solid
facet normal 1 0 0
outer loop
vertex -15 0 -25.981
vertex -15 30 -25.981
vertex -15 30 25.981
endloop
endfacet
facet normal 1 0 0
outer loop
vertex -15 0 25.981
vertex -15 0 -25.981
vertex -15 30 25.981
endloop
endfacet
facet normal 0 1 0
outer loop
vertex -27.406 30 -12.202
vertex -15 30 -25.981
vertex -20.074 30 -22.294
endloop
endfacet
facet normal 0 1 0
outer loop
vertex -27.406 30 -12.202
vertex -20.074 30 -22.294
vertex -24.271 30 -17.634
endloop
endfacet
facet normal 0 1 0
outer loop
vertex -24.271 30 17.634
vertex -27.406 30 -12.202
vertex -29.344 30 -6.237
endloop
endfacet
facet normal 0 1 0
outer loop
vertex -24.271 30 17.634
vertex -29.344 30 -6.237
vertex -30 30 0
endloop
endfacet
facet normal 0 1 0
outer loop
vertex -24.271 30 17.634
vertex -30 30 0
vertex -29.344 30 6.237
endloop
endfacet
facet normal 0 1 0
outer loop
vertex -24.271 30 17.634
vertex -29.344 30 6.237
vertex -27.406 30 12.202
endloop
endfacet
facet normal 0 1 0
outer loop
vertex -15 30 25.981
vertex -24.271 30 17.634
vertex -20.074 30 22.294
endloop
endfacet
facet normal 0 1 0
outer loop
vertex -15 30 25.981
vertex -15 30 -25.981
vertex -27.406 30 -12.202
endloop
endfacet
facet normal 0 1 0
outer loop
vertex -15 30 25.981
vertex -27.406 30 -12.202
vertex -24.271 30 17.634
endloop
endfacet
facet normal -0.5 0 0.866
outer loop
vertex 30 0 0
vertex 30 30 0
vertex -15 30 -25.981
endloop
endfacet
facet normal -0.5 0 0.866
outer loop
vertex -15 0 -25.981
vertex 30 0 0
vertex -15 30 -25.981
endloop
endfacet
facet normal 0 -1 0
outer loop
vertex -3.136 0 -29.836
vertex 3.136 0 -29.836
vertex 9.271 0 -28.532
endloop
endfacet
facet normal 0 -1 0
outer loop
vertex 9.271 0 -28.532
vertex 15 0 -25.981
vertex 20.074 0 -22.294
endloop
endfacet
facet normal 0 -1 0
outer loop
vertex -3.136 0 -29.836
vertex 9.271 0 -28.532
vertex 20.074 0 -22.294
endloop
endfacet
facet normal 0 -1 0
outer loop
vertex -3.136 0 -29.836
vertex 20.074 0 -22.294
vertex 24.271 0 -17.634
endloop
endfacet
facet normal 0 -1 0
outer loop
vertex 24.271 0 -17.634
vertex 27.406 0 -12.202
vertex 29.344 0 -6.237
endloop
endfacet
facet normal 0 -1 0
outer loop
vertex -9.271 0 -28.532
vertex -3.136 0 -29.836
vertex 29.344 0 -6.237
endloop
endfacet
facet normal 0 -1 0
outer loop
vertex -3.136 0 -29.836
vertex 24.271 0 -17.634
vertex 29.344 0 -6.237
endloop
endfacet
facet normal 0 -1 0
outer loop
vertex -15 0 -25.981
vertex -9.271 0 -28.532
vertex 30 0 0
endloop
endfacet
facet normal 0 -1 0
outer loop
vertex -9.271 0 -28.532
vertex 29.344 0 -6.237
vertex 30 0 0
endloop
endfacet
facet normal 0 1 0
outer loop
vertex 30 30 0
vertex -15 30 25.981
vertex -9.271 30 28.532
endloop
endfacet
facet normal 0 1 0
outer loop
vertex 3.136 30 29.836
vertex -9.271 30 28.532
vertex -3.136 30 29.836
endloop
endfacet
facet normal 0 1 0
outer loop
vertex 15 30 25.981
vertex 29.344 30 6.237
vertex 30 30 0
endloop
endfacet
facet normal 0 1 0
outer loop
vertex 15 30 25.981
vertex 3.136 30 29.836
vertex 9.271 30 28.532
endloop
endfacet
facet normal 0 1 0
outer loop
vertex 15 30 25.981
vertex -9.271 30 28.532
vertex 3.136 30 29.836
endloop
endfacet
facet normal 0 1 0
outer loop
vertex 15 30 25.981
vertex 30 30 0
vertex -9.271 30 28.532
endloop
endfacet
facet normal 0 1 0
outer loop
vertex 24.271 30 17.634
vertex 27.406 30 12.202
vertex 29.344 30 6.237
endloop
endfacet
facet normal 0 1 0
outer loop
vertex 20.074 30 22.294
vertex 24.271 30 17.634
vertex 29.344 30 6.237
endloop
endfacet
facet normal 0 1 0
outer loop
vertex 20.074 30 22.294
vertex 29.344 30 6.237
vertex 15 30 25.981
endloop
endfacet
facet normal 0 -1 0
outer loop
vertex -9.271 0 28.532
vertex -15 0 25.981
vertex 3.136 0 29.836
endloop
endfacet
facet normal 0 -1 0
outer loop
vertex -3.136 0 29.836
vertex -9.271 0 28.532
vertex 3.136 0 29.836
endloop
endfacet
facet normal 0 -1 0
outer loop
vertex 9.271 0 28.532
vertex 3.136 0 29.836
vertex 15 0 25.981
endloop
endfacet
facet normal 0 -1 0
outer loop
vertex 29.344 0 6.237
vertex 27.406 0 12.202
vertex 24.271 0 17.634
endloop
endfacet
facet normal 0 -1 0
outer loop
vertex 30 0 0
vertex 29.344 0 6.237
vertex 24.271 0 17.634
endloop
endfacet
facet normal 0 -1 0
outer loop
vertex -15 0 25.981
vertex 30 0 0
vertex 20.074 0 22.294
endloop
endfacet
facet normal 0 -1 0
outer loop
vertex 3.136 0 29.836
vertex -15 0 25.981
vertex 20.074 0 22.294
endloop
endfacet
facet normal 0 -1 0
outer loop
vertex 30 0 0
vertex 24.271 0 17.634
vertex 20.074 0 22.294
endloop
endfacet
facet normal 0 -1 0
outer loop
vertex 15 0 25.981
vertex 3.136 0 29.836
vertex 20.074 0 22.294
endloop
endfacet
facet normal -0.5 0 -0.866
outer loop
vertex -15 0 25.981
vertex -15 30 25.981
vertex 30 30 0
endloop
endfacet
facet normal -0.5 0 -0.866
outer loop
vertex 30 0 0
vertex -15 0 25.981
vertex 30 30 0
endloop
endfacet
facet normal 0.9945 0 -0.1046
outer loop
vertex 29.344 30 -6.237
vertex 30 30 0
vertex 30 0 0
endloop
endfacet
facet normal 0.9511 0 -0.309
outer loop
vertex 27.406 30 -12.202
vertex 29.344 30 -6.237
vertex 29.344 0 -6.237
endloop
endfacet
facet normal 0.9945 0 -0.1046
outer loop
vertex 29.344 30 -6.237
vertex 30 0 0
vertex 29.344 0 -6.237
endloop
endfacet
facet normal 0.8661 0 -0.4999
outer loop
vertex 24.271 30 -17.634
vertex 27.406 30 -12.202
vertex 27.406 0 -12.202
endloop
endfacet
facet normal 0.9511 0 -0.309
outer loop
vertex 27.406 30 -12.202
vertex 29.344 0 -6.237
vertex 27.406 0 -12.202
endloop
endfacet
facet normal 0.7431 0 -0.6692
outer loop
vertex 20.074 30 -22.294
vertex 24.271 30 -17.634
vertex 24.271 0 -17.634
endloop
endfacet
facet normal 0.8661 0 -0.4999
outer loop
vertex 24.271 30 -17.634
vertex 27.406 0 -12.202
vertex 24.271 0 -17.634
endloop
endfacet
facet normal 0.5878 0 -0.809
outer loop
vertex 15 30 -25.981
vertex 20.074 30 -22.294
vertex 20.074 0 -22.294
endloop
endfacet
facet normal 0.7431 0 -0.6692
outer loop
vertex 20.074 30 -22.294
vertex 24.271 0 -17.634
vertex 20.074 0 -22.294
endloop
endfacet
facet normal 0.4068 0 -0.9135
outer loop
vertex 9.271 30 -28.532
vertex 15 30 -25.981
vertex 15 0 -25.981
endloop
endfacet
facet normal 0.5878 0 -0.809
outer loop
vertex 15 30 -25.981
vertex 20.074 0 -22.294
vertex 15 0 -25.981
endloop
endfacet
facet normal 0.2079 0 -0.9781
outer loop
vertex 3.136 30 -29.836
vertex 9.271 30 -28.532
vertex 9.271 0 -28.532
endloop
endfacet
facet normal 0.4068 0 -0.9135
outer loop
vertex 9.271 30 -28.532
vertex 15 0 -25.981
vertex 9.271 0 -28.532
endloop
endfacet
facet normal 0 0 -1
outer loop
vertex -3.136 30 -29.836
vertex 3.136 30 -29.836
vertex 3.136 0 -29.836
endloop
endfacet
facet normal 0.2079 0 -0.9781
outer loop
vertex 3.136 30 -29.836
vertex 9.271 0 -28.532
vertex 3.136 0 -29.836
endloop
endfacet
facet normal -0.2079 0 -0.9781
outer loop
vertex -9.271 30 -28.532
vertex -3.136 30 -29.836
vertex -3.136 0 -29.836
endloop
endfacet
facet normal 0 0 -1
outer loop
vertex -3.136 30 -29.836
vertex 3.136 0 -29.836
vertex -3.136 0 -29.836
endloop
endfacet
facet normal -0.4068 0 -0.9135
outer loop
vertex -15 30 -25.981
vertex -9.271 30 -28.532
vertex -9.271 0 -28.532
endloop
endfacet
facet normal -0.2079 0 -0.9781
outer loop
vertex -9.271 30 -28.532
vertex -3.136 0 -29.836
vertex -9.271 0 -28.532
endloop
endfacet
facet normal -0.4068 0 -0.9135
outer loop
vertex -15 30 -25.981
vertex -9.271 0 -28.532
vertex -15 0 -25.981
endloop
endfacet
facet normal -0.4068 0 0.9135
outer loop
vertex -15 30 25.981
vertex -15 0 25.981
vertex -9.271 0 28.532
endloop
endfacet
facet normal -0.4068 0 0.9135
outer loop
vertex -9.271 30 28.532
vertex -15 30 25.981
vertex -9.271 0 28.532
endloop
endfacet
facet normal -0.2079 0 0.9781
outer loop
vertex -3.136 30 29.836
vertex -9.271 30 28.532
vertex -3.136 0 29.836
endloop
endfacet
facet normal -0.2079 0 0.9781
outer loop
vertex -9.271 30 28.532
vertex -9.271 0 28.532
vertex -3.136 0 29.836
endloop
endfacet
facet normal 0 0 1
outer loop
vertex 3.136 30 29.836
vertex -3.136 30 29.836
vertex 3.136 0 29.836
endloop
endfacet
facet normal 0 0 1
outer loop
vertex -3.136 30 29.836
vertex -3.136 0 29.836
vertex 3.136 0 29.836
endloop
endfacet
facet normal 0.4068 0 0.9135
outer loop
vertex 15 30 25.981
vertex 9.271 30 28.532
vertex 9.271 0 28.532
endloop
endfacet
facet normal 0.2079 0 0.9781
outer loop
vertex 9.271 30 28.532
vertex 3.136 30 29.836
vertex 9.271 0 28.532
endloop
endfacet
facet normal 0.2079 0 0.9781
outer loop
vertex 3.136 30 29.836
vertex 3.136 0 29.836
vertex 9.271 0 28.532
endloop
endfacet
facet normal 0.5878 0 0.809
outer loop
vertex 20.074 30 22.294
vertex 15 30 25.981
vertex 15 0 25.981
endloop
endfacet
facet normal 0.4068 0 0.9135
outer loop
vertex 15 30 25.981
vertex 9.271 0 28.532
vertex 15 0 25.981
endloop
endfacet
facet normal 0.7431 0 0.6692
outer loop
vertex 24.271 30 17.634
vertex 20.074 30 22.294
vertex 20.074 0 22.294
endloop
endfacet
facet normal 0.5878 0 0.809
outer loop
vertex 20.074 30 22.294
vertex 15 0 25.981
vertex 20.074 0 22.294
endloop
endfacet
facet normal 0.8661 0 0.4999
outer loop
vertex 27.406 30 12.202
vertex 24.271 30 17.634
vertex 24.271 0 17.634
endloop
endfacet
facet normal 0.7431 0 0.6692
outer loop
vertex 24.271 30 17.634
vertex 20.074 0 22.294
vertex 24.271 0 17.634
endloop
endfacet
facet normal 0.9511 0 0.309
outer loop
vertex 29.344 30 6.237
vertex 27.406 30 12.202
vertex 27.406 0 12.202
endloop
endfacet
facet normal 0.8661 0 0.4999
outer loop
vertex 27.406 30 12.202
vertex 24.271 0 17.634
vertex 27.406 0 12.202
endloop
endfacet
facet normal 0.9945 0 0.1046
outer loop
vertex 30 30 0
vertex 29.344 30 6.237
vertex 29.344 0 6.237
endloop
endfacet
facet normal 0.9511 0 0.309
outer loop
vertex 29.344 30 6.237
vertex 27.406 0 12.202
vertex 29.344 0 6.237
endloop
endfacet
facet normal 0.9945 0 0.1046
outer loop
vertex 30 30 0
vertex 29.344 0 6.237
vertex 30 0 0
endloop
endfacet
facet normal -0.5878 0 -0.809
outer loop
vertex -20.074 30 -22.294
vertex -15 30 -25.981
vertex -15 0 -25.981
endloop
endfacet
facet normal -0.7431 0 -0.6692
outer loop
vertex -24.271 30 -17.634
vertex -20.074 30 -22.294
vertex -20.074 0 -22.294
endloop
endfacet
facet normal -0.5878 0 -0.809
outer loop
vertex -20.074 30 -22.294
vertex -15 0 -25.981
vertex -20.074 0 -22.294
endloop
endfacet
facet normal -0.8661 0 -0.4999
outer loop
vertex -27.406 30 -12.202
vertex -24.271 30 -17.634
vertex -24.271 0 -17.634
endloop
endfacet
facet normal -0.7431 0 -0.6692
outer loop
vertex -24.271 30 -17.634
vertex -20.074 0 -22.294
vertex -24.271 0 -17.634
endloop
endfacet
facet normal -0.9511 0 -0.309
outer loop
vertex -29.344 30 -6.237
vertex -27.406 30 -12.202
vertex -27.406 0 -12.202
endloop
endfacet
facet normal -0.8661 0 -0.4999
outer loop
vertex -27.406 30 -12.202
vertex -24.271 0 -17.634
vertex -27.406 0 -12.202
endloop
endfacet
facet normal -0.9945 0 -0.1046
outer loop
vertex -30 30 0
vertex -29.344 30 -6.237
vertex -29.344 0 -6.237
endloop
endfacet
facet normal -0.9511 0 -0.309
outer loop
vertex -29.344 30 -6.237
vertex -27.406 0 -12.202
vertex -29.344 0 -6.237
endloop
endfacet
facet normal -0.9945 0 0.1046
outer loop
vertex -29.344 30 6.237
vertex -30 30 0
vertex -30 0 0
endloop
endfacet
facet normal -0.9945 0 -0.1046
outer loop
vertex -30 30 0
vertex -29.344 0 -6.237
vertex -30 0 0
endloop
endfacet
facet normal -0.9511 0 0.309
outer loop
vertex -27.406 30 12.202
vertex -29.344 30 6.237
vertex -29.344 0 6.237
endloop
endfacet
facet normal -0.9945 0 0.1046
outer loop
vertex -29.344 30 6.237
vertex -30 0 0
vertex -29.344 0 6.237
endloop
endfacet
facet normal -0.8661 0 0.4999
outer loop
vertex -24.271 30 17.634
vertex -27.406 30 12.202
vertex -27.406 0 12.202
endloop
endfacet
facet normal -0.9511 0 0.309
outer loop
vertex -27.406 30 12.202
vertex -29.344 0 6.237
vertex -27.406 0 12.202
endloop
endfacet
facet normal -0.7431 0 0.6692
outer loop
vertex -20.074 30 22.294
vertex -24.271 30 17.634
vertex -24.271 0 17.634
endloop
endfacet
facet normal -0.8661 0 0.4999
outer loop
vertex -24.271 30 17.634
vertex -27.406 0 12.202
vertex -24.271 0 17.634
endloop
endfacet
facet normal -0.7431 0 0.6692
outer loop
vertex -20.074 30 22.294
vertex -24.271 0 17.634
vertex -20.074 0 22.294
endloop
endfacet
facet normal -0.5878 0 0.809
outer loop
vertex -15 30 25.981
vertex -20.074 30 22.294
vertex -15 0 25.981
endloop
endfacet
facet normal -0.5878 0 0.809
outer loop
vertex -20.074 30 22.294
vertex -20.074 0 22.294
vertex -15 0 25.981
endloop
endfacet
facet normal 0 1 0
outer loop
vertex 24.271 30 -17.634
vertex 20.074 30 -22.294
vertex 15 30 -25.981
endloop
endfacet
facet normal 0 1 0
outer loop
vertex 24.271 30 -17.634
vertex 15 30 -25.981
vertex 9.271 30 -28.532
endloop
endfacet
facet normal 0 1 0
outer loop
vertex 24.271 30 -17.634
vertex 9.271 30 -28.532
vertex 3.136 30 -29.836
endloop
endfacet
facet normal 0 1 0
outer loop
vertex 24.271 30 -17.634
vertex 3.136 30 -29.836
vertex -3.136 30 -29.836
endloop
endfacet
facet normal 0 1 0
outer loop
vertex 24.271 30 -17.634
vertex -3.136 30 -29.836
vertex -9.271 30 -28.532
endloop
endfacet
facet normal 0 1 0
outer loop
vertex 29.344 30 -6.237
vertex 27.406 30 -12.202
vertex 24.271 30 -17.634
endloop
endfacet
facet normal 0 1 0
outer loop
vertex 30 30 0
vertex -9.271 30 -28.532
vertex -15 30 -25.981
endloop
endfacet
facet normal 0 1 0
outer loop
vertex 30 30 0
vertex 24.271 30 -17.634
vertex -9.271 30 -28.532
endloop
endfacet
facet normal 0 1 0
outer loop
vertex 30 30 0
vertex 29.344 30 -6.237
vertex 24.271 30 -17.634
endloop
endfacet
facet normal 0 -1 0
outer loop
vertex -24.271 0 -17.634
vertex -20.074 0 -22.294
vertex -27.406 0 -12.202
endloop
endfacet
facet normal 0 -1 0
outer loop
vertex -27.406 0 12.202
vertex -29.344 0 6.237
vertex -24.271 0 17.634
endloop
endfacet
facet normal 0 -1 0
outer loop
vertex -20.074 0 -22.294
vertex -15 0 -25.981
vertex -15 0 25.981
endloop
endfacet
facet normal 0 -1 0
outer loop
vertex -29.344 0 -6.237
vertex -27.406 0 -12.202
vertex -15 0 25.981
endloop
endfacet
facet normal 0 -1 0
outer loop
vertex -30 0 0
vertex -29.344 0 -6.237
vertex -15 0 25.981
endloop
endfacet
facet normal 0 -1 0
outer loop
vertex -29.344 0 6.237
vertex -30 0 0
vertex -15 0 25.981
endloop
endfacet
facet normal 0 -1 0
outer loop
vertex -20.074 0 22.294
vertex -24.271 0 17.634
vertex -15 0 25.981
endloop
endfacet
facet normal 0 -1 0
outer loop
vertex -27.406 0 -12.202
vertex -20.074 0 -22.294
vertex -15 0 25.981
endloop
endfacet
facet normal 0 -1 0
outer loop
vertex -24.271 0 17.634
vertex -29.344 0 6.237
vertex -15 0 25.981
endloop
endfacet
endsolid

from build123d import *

# Parameters (mm, degrees)
SKETCH_1_R          = 30
EXTRUDE_1_DEPTH     = 30
CUT_EXTRUDE_1_DEPTH = 52.961524227


with BuildPart() as part:
    # 草图1 → 凸台-拉伸1 (new body)
    with BuildSketch(Plane(origin=(0, 0, 0), x_dir=(1, 0, 0), z_dir=(0, 1, 0))):
        with Locations(Location((0, 0, 0), (0, 0, 270))):
            Circle(SKETCH_1_R)
    extrude(amount=EXTRUDE_1_DEPTH)

    # 草图2 → 切除-拉伸1 (cut, through all)
    with BuildSketch(Plane(origin=(0, 30, 0), x_dir=(1, 0, 0), z_dir=(0, 1, 0))):
        Polygon((30, 0), (-15, 25.980762114), (-15, -25.980762114), align=None)
    extrude(amount=-CUT_EXTRUDE_1_DEPTH, mode=Mode.SUBTRACT)


solid = part.part
